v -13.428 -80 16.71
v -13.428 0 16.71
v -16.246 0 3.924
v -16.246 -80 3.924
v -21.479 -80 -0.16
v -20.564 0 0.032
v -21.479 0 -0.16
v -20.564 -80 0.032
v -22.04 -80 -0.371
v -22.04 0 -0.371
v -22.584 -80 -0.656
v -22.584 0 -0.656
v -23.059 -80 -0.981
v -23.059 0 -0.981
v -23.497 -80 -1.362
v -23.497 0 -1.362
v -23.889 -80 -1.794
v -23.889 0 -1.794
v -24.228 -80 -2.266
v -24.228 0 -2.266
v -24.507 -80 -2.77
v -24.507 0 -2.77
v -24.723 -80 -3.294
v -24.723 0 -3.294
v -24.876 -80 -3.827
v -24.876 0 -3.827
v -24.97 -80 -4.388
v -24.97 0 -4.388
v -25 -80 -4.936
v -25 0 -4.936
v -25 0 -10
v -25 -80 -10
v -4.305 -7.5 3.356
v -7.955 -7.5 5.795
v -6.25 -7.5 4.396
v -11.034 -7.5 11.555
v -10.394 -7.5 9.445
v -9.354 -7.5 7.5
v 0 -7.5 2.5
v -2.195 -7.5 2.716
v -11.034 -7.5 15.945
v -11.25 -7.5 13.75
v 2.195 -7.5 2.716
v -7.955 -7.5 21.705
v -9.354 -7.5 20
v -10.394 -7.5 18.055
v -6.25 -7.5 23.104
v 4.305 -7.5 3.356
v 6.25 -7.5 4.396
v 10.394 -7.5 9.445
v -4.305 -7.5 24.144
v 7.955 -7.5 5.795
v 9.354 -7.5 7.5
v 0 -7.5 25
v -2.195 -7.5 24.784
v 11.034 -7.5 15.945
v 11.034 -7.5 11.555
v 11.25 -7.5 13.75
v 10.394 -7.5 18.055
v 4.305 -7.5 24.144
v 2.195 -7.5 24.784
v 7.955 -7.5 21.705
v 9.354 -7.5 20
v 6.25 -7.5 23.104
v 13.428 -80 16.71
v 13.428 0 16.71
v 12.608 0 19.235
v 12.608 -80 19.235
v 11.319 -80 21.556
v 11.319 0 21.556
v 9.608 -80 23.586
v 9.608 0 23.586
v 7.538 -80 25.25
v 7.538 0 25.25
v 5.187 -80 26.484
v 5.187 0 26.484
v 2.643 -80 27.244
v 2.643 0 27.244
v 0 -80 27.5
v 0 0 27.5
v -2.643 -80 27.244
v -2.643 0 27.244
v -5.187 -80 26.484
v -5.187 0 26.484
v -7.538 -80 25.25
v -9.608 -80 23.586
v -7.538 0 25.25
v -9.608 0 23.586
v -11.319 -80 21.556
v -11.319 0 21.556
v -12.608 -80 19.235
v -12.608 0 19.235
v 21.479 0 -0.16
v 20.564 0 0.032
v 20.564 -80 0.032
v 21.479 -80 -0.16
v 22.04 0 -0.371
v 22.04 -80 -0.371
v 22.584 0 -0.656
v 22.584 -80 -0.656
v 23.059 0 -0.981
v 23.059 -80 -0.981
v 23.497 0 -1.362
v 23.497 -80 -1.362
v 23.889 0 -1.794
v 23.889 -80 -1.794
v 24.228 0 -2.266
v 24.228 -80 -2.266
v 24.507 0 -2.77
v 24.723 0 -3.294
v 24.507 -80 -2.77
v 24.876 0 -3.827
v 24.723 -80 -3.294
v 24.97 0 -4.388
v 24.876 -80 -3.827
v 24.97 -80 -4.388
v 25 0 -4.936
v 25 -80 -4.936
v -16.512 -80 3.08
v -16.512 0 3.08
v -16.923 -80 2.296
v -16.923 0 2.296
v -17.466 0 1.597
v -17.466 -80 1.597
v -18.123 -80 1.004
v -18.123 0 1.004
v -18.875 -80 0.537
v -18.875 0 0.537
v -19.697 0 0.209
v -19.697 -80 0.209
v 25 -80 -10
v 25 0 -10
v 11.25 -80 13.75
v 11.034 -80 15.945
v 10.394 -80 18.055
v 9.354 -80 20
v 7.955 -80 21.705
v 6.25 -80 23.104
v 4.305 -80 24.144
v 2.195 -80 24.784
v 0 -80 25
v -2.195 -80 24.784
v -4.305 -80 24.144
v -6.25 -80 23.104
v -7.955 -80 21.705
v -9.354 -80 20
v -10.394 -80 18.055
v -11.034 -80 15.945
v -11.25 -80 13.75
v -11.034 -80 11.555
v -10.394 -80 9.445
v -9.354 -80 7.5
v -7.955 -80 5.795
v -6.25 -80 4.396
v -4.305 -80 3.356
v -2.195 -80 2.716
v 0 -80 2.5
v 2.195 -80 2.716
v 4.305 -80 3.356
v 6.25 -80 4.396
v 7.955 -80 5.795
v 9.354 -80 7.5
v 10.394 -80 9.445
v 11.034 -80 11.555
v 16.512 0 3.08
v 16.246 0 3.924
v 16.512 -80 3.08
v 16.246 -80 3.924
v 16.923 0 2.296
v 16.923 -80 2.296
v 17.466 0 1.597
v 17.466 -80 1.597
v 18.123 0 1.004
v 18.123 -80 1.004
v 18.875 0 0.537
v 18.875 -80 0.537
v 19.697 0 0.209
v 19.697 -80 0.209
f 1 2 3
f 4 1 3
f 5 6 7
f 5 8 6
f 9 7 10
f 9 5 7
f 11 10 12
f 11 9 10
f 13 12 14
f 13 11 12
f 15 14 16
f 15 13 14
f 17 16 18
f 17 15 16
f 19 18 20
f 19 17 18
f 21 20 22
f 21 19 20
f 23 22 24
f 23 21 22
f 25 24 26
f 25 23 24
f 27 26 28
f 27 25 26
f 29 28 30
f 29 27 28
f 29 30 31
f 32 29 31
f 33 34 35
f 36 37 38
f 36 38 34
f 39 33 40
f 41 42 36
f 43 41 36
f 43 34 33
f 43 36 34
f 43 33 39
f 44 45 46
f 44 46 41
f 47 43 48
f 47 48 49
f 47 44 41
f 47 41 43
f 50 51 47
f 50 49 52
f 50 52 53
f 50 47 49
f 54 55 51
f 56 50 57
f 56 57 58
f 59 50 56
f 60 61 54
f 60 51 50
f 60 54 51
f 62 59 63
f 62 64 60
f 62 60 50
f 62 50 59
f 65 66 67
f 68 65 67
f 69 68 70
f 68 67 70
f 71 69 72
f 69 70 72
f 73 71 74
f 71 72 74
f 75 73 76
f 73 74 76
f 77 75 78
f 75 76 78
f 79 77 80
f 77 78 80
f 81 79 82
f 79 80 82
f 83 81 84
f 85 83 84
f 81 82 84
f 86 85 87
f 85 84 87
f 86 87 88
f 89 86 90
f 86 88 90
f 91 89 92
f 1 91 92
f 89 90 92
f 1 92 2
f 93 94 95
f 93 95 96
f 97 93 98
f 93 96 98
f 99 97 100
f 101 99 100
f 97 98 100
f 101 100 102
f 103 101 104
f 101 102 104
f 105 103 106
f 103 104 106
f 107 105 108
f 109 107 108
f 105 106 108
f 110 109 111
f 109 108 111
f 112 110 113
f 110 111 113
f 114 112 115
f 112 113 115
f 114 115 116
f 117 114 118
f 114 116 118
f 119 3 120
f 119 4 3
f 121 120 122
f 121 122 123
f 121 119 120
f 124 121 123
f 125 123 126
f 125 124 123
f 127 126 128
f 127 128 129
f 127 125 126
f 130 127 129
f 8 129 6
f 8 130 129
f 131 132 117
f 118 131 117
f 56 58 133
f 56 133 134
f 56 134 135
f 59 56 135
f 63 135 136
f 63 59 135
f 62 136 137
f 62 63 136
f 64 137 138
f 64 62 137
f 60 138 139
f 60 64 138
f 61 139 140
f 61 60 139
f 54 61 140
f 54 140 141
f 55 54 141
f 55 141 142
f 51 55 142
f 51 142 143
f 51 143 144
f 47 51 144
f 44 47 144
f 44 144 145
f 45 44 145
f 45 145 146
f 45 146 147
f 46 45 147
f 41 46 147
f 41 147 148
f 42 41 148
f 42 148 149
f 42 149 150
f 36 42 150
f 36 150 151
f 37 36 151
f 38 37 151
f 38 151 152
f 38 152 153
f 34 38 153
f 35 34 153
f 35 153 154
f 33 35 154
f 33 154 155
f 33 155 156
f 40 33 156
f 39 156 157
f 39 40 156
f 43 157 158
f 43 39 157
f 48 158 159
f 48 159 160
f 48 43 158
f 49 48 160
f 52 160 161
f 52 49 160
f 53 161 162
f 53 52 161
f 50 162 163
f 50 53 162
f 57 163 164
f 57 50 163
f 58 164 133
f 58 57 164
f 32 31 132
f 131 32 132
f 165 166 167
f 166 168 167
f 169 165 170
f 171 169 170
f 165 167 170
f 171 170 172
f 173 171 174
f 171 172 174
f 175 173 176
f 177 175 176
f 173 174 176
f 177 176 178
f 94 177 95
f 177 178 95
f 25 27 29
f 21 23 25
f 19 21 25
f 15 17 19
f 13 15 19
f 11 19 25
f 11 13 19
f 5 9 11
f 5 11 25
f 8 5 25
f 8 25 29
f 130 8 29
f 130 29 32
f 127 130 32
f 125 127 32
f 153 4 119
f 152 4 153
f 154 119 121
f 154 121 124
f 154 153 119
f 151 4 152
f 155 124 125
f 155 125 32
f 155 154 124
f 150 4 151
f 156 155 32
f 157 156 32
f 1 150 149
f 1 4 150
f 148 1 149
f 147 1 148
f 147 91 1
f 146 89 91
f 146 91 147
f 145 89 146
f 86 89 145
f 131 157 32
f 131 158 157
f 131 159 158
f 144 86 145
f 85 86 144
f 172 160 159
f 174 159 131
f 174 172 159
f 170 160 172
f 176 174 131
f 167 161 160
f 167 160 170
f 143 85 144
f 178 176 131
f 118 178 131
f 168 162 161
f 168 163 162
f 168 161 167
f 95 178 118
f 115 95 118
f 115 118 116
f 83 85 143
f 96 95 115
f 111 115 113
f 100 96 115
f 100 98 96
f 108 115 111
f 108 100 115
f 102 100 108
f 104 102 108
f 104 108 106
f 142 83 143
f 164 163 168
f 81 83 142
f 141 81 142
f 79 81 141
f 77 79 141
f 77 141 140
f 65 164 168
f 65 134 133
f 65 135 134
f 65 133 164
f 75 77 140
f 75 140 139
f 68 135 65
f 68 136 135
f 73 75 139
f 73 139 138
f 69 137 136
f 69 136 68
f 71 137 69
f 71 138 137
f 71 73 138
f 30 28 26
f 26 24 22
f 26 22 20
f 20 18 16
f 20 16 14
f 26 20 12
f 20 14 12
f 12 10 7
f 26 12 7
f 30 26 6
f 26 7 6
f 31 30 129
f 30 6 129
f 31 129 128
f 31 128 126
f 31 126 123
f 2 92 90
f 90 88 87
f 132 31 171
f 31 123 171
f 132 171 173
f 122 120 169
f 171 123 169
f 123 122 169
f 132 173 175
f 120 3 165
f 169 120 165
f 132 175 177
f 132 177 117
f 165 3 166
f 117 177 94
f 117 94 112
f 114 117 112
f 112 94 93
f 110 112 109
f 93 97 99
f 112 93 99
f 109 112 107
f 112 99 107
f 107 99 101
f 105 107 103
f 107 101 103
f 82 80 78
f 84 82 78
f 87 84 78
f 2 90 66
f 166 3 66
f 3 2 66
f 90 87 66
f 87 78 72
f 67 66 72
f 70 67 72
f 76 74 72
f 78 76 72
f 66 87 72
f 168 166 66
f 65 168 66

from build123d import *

# Parameters (mm, degrees)
F0_R     = 11.25
F1_DEPTH = 80
F2_DEPTH = 7.5
F3_R     = 5
F4_R     = 5


with BuildPart() as f1:
    # F0 (on Front) → F1 (new body)
    with BuildSketch(Plane.XZ):
        with BuildLine():
            ThreePointArc((13.75, 13.75), (9.722718, 4.027282), (0, 0))
            Line((0, 0), (17.110662, 0))
            Line((17.110662, 0), (13.427706, 16.709596))
            ThreePointArc((13.427706, 16.709596), (13.669189, 15.238546), (13.75, 13.75))
        make_face()
        Polygon((17.110662, 0), (0, 0), (-17.110662, 0), (-25, 0), (-25, -10), (25, -10), (25, 0), align=None)
        with BuildLine():
            Line((-17.110662, 0), (0, 0))
            ThreePointArc((0, 0), (-10.718137, 5.136985), (-13.427706, 16.709596))
            Line((-13.427706, 16.709596), (-17.110662, 0))
        make_face()
        with BuildLine():
            ThreePointArc((-13.427706, 16.709596), (-10.718137, 5.136985), (0, 0))
            ThreePointArc((0, 0), (9.722718, 4.027282), (13.75, 13.75))
            ThreePointArc((13.75, 13.75), (13.669189, 15.238546), (13.427706, 16.709596))
            ThreePointArc((13.427706, 16.709596), (0, 27.5), (-13.427706, 16.709596))
        make_face()
        with Locations((0, 13.75)):
            Circle(F0_R, mode=Mode.SUBTRACT)
    extrude(amount=F1_DEPTH)

    # F0 (on Front) → F2 (join)
    with BuildSketch(Plane.XZ):
        with Locations((0, 13.75)):
            Circle(F0_R)
    extrude(amount=F2_DEPTH)

    # F3
    f3_edges = [f1.edges().sort_by_distance(p)[0] for p in [
        (-17.110662, -40, 0),
        (17.110662, -40, 0),
    ]]
    fillet(f3_edges, radius=F3_R)

    # F4
    f4_edges = [f1.edges().sort_by_distance(p)[0] for p in [
        (-25, -40, 0),
        (25, -40, 0),
    ]]
    fillet(f4_edges, radius=F4_R)


solid = f1.part
